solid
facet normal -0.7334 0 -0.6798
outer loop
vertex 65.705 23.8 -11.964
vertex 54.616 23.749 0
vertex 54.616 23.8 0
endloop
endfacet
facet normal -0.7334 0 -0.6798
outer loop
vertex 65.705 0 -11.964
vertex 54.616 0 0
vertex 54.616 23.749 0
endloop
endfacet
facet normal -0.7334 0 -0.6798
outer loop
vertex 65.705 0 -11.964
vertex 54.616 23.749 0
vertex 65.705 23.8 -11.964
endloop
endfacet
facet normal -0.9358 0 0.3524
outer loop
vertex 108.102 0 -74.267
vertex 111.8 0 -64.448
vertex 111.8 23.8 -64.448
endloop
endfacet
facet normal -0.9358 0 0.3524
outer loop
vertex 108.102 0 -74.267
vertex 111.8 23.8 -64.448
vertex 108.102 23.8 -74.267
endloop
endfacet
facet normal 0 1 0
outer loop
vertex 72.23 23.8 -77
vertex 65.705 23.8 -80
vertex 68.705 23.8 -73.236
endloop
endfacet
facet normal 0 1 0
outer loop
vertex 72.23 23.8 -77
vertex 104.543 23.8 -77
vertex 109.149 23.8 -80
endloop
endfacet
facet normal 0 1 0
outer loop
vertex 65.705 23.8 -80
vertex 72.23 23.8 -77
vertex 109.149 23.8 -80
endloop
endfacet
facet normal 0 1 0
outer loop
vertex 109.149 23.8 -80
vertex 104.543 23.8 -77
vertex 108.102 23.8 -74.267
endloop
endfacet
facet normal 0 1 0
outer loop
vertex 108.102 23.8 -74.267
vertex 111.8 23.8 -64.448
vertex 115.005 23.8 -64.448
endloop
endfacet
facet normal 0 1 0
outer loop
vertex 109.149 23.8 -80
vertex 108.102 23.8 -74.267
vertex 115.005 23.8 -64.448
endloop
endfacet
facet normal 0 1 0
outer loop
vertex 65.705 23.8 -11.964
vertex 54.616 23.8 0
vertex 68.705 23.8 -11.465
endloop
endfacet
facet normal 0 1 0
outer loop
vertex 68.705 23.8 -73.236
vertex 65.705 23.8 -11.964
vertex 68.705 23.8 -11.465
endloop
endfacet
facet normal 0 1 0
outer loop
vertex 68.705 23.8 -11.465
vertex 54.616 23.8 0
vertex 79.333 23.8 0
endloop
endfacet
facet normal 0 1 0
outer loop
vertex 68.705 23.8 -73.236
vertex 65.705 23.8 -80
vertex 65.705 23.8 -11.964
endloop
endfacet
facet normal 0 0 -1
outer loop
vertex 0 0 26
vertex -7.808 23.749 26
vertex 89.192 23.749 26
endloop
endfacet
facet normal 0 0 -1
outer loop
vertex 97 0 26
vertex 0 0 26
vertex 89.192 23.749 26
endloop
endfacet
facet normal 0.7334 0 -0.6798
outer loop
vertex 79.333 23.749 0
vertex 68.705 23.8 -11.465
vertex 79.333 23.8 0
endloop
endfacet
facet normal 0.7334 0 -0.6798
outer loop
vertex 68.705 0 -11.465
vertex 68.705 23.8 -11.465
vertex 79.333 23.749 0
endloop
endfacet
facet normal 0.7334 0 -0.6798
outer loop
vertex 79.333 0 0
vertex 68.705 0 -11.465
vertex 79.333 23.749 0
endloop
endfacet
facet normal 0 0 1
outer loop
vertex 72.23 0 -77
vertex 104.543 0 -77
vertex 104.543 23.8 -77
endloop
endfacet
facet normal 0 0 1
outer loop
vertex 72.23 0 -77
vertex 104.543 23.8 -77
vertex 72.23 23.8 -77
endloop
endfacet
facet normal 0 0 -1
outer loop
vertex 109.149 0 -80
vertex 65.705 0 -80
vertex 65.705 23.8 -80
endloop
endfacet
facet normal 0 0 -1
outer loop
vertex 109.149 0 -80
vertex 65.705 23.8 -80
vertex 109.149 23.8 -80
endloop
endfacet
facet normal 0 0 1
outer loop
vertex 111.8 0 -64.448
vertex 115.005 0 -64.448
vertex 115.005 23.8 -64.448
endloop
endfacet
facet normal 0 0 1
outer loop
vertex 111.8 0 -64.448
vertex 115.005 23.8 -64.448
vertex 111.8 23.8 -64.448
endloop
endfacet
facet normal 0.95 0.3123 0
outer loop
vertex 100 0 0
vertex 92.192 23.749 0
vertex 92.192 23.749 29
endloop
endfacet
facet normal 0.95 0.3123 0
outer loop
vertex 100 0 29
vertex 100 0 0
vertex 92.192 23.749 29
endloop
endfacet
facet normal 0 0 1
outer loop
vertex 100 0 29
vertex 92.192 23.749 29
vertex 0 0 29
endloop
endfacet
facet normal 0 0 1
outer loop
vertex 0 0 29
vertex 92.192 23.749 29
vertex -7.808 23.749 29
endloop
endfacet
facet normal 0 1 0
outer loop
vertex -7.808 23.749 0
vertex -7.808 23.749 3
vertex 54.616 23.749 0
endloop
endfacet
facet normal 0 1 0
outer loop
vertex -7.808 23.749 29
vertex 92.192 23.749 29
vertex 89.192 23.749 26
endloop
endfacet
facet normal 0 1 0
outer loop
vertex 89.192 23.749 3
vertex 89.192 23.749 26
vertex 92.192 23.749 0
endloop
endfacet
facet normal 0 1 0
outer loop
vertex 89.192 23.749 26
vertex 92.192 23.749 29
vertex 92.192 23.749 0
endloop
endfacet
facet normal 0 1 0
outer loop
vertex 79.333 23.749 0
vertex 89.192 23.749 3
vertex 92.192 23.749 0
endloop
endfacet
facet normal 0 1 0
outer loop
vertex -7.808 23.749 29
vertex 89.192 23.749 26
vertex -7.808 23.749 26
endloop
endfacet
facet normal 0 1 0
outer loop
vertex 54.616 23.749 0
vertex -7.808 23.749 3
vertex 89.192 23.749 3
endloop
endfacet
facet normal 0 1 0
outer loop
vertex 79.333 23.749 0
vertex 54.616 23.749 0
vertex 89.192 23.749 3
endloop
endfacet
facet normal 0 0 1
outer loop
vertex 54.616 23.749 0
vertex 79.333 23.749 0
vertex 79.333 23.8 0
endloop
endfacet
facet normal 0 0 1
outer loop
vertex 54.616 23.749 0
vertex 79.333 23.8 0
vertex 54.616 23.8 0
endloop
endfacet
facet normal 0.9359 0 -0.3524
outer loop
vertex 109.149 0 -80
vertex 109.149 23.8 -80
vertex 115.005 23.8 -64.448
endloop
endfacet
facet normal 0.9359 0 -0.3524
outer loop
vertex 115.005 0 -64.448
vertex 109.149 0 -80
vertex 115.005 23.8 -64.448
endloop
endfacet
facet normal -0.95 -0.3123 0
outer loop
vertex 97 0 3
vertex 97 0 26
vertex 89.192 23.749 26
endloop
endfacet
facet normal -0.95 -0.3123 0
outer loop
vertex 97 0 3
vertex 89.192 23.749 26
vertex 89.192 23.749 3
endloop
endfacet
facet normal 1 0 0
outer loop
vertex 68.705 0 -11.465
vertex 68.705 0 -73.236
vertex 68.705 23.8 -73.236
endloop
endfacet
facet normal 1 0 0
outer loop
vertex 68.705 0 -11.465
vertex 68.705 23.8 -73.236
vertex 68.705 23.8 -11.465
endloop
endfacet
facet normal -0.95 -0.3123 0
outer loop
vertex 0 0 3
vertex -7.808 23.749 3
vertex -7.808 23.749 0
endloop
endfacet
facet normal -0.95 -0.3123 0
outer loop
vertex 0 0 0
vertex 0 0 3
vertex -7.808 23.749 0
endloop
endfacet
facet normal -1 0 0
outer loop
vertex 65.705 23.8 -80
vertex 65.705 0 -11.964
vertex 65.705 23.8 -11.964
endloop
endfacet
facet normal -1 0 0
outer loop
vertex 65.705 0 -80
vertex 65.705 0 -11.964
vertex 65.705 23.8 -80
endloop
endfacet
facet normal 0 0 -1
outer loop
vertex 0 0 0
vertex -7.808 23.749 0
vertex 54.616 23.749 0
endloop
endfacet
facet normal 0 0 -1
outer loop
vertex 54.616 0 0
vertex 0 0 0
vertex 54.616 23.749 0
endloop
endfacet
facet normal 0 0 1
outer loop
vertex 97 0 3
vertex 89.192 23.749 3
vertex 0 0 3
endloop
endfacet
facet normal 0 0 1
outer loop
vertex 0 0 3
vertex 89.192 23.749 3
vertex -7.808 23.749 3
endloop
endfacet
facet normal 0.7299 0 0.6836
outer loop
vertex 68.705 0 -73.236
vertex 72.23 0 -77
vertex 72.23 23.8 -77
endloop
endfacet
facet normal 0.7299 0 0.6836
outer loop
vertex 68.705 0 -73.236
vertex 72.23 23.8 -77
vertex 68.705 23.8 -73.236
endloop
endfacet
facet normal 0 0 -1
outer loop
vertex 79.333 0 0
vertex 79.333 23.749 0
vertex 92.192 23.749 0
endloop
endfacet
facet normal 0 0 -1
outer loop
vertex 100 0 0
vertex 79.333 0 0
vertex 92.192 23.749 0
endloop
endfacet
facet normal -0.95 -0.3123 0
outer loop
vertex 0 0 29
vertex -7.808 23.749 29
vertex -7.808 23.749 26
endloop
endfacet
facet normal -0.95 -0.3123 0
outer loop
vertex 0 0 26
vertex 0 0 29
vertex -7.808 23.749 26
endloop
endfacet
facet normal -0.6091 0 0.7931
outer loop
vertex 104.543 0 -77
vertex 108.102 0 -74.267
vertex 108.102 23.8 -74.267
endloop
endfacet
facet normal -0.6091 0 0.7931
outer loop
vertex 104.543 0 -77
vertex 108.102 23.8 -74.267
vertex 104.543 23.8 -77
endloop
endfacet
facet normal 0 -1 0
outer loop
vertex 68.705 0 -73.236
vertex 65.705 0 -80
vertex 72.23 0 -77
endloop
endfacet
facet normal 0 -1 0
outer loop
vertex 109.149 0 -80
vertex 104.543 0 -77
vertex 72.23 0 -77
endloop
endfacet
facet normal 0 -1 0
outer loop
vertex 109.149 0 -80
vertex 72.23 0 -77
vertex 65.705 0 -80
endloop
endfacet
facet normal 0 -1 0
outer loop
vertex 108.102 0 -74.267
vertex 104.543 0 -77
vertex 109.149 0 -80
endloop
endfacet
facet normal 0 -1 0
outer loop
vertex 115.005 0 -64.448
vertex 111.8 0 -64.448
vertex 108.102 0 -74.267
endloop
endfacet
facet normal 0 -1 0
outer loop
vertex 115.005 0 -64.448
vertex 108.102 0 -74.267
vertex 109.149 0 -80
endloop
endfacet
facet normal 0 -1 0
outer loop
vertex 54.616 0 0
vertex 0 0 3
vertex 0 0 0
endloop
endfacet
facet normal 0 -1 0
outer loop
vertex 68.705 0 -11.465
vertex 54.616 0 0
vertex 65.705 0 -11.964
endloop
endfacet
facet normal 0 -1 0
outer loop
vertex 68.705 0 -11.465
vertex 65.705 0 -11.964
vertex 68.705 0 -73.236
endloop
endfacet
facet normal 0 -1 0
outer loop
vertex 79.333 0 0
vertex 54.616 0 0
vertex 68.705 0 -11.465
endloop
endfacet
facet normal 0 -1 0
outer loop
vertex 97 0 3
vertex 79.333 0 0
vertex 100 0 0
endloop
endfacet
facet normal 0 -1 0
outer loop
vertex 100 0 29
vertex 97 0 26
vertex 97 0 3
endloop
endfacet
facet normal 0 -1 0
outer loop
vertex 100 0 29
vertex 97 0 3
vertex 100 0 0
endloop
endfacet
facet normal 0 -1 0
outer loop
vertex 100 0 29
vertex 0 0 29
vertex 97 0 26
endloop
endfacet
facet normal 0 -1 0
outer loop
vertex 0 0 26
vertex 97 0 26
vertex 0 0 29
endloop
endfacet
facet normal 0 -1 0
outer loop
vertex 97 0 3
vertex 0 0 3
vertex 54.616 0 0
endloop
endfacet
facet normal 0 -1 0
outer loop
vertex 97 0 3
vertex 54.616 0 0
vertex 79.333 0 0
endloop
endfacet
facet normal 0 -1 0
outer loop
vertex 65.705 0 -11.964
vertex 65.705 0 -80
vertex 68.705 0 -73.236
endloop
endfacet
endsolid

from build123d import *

# Parameters (mm, degrees)
F4_DEPTH = 23.8


with BuildPart() as f2:
    # F2: sweep along a path in F1
    with BuildLine(Plane.XY) as f2_path:
        Line((100, 0), (92.191627, 23.749301))
    # F0 (on Front) → F2 (sweep)
    with BuildSketch(Plane.XZ):
        Polygon((100, 29), (0, 29), (0, 26), (97, 26), (97, 3), (0, 3), (0, 0), (100, 0), align=None)
    sweep(path=f2_path.line)

    # F3 (on Front) → F4 (join)
    with BuildSketch(Plane.XZ):
        Polygon((68.705302, -11.464806), (68.705302, 0), (65.705302, 0), (65.705302, -11.963572), (66.974133, -13.332377), align=None)
        Polygon((68.705302, -73.235512), (68.705302, -11.464806), (66.974133, -13.332377), (65.705302, -11.963572), (65.705302, -80), (109.149036, -80), (115.005407, -64.447597), (111.799763, -64.447597), (108.102038, -74.267415), (107.073064, -77), (104.542602, -77), (72.230041, -77), (68.705302, -77), align=None)
        Polygon((79.33275, 0), (68.705302, 0), (68.705302, -11.464806), align=None)
        Polygon((65.705302, -11.963572), (65.705302, 0), (54.615512, 0), align=None)
        Polygon((72.230041, -77), (68.705302, -73.235512), (68.705302, -77), align=None)
        Polygon((108.102038, -74.267415), (104.542602, -77), (107.073064, -77), align=None)
    extrude(amount=-F4_DEPTH)


solid = f2.part
